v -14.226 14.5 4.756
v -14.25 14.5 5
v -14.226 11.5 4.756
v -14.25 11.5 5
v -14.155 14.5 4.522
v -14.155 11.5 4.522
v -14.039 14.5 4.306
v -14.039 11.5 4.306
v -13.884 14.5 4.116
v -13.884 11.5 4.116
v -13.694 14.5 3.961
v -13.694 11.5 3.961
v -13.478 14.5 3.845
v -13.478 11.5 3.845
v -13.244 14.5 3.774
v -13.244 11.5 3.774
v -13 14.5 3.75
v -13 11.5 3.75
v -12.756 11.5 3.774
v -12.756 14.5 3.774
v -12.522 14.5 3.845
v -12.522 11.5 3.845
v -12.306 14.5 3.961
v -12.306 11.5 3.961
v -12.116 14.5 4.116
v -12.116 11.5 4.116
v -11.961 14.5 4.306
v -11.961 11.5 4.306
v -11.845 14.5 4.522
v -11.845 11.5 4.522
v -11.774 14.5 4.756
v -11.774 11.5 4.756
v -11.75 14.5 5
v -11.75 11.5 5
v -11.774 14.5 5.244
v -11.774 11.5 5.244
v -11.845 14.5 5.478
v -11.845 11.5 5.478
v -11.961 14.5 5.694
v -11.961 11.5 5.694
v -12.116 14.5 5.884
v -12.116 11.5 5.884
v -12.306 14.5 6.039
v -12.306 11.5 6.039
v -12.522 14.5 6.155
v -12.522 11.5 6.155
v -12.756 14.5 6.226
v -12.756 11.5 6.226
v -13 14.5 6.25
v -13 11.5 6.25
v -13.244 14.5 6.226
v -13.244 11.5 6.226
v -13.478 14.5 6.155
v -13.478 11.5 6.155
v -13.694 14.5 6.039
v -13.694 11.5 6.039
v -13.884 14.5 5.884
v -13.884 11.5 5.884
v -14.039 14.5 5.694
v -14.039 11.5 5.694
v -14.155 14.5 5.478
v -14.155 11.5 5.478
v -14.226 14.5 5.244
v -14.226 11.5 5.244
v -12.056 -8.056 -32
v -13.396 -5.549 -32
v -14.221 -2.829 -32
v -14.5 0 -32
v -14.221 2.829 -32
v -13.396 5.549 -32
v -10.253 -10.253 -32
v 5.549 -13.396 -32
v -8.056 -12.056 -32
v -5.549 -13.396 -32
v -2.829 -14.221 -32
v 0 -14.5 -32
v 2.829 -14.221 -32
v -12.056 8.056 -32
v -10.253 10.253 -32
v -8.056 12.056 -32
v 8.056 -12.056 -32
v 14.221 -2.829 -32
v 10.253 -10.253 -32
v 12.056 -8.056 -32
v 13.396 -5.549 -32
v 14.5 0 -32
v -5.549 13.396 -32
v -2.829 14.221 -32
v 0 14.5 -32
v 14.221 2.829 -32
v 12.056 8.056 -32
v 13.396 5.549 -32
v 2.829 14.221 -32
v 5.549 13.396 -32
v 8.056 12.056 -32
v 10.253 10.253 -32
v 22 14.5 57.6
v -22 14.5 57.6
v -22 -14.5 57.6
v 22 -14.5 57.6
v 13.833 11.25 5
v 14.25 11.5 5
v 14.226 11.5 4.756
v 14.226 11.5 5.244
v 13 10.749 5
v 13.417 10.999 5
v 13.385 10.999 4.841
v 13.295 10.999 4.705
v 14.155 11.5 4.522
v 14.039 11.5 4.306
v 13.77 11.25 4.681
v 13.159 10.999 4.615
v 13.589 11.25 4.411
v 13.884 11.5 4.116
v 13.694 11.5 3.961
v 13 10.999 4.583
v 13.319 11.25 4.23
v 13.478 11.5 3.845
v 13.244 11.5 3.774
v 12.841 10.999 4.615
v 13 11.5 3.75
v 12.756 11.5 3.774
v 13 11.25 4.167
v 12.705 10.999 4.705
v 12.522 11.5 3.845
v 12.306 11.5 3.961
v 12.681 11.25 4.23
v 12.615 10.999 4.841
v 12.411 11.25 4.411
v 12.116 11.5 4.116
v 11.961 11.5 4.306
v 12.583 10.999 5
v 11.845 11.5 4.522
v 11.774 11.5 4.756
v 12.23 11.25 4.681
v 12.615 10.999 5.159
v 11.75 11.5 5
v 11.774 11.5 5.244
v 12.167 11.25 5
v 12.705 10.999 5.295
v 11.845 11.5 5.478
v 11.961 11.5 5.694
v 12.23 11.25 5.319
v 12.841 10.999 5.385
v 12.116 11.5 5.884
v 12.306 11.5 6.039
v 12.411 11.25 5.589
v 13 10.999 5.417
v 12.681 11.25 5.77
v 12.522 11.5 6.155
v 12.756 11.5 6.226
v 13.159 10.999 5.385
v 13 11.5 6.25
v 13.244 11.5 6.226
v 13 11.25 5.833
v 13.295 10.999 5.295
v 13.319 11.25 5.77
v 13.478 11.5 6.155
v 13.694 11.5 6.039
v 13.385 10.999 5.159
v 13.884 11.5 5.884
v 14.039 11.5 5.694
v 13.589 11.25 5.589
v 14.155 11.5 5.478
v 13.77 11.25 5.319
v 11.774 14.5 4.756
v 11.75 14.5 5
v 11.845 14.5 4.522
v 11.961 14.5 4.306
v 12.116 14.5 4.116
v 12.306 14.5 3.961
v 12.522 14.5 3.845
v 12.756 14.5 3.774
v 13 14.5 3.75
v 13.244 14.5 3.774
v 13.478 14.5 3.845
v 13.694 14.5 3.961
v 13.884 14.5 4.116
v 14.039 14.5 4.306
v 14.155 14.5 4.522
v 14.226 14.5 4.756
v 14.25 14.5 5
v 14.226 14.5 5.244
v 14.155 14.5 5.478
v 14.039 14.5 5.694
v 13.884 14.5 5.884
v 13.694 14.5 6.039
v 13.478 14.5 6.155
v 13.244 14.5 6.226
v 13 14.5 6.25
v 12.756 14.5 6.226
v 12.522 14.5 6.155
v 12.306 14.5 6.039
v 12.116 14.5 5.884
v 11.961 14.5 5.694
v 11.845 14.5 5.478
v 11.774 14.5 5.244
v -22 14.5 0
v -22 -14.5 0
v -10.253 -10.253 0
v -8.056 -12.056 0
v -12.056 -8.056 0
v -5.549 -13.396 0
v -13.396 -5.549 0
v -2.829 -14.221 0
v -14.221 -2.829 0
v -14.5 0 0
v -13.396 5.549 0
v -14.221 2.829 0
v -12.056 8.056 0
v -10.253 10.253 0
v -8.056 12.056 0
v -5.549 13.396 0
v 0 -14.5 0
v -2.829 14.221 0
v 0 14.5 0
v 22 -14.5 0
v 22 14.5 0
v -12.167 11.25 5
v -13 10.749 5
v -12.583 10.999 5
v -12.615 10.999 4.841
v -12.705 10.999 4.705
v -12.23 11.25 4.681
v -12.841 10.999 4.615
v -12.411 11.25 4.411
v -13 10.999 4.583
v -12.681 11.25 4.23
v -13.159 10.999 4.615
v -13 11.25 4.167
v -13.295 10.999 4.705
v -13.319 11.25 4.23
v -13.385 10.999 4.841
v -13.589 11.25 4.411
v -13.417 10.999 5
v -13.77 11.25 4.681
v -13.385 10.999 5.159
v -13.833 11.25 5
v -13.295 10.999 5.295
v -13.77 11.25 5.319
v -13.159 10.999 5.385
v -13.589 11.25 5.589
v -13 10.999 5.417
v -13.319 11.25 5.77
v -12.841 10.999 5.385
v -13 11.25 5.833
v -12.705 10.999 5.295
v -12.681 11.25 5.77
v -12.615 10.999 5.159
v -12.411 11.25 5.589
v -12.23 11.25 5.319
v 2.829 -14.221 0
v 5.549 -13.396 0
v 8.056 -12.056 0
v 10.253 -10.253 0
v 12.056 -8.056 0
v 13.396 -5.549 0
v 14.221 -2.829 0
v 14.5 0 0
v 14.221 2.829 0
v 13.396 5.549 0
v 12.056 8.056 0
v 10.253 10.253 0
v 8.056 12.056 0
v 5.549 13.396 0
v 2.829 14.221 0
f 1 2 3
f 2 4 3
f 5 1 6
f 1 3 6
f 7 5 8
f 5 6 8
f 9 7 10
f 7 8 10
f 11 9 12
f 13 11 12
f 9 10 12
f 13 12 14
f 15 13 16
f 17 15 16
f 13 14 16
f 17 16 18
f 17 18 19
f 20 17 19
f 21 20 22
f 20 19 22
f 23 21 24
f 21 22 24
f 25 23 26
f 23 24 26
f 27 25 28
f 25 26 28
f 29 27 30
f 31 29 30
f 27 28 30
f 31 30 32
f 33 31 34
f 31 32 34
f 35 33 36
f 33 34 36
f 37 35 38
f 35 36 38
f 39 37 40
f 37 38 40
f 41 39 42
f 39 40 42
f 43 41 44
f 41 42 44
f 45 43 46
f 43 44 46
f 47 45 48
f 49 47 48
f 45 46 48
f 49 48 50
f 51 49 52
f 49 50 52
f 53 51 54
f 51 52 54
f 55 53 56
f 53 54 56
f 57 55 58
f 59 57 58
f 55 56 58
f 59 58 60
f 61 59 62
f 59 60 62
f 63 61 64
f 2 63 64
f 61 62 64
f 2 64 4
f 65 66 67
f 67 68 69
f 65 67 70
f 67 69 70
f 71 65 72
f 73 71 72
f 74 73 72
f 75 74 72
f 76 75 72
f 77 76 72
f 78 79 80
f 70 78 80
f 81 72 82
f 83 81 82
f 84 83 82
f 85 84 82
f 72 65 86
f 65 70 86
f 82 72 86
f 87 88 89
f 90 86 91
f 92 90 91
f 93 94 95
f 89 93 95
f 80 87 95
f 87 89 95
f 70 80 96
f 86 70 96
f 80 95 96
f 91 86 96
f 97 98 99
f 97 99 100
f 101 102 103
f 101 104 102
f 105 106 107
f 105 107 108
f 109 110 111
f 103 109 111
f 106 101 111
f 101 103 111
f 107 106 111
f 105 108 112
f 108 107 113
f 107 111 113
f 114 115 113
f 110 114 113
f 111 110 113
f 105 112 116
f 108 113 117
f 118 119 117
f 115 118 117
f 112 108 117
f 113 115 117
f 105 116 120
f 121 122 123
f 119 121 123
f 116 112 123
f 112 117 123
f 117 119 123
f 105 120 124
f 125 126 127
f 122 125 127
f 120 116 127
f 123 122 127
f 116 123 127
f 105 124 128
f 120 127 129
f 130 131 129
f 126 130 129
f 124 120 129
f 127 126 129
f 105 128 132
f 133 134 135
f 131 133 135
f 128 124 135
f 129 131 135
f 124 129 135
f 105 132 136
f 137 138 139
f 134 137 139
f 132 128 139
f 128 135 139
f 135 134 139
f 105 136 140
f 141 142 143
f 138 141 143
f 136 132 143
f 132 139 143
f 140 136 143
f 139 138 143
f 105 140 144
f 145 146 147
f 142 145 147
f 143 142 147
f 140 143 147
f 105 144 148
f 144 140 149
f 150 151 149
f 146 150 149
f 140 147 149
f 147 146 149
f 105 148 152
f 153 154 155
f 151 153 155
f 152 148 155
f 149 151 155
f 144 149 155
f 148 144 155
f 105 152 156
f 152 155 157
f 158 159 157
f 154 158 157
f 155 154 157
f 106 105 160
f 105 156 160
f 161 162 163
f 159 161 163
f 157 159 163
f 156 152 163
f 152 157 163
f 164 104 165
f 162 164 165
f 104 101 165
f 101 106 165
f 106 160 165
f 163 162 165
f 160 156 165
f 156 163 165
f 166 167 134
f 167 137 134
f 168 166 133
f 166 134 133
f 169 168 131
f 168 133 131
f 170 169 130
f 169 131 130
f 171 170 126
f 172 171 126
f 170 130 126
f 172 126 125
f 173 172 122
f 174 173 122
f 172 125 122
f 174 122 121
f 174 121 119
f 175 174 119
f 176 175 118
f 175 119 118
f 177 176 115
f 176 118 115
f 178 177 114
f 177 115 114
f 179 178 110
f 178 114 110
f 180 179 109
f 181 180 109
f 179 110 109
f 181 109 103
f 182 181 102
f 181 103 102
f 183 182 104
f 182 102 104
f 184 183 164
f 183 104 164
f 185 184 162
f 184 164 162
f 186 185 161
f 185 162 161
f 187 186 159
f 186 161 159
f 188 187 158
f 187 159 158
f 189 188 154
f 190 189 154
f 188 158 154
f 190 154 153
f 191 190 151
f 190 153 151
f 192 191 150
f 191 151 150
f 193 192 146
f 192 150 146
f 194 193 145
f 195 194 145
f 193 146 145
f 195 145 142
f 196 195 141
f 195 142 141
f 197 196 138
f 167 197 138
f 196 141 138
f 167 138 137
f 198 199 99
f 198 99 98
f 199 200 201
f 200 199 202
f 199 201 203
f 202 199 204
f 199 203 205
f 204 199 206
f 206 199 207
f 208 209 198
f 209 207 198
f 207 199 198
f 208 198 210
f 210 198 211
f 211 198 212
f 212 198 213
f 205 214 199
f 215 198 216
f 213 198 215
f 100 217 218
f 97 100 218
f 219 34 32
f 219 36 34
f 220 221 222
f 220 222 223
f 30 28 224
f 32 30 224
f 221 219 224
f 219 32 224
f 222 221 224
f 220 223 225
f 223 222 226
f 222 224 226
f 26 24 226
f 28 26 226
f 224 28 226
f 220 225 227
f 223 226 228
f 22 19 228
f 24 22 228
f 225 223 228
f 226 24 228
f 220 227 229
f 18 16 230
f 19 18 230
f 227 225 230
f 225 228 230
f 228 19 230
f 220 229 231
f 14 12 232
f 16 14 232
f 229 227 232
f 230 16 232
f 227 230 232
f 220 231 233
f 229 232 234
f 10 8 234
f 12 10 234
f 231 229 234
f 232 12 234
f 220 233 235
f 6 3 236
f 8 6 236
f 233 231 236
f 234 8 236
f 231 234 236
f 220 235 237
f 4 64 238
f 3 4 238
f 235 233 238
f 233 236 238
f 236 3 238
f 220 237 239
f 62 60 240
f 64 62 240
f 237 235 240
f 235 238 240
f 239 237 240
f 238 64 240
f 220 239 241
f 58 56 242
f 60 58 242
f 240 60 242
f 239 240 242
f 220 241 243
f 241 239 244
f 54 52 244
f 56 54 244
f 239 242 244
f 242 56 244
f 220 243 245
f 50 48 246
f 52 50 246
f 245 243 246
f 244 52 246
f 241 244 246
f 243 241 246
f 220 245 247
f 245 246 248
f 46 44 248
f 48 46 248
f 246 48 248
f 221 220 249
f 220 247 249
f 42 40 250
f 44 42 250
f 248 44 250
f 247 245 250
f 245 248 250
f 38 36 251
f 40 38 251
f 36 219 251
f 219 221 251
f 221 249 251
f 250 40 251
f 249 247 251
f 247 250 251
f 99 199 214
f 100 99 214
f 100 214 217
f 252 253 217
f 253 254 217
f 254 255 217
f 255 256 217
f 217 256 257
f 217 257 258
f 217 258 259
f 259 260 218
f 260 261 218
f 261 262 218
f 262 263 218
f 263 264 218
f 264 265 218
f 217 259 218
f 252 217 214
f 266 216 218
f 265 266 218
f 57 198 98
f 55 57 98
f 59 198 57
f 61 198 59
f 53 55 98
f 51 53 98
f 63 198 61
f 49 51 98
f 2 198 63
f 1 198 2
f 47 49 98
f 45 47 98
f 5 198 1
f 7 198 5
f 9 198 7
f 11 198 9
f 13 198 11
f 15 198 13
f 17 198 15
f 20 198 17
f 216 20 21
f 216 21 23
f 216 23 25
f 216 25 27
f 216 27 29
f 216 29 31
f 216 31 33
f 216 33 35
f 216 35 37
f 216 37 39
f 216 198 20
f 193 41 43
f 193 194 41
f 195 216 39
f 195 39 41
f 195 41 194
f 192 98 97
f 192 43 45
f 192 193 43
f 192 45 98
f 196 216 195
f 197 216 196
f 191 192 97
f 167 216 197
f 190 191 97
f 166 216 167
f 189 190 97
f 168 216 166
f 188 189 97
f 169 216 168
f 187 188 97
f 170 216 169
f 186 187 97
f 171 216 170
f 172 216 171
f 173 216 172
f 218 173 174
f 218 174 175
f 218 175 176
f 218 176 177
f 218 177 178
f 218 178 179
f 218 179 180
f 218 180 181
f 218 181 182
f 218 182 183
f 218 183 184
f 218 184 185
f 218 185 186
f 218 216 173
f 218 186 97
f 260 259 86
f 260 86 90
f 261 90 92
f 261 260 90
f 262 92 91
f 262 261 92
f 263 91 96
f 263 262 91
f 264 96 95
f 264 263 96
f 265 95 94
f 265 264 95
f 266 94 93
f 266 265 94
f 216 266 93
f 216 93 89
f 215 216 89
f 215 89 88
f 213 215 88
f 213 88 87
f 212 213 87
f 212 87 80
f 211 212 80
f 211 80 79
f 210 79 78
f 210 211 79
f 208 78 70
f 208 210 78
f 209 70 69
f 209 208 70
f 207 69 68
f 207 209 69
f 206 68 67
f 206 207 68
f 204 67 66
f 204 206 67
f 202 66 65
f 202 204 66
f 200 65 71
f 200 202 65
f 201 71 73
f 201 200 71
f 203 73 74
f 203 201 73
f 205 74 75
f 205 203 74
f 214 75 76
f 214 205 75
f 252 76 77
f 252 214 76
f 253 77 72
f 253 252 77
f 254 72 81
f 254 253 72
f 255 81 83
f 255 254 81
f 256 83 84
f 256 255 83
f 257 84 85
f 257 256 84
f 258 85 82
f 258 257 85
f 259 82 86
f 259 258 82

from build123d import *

# Parameters (mm, degrees)
SKETCH1_W                 = 44
SKETCH1_H                 = 29
BOSS_EXTRUDE1_DEPTH       = 57.6
SKETCH2_R                 = 14.5
BOSS_EXTRUDE2_DEPTH       = 32
M3X0_5_TAPPED_HOLE1_D     = 2.5
M3X0_5_TAPPED_HOLE1_DEPTH = 3
M3X0_5_TAPPED_HOLE1_TIP   = 0.751075774


with BuildPart() as part:
    # Sketch1 → Boss-Extrude1 (new body)
    with BuildSketch(Plane.XY):
        Rectangle(SKETCH1_W, SKETCH1_H)
    extrude(amount=BOSS_EXTRUDE1_DEPTH)

    # Sketch2 → Boss-Extrude2 (add)
    with BuildSketch(Plane.XY):
        Circle(SKETCH2_R)
    extrude(amount=-BOSS_EXTRUDE2_DEPTH)

    # M3x0.5 Tapped Hole1
    with Locations(Plane(origin=(0, 14.5, 0), x_dir=(1, 0, 0), z_dir=(0, 1, 0))):
        with Locations((-13, -5), (13, -5)):
            Hole(M3X0_5_TAPPED_HOLE1_D / 2, depth=M3X0_5_TAPPED_HOLE1_DEPTH)
            with Locations((0, 0, -(M3X0_5_TAPPED_HOLE1_DEPTH + M3X0_5_TAPPED_HOLE1_TIP / 2))):  # 118° drill point
                Cone(0, M3X0_5_TAPPED_HOLE1_D / 2, M3X0_5_TAPPED_HOLE1_TIP, mode=Mode.SUBTRACT)


solid = part.part
